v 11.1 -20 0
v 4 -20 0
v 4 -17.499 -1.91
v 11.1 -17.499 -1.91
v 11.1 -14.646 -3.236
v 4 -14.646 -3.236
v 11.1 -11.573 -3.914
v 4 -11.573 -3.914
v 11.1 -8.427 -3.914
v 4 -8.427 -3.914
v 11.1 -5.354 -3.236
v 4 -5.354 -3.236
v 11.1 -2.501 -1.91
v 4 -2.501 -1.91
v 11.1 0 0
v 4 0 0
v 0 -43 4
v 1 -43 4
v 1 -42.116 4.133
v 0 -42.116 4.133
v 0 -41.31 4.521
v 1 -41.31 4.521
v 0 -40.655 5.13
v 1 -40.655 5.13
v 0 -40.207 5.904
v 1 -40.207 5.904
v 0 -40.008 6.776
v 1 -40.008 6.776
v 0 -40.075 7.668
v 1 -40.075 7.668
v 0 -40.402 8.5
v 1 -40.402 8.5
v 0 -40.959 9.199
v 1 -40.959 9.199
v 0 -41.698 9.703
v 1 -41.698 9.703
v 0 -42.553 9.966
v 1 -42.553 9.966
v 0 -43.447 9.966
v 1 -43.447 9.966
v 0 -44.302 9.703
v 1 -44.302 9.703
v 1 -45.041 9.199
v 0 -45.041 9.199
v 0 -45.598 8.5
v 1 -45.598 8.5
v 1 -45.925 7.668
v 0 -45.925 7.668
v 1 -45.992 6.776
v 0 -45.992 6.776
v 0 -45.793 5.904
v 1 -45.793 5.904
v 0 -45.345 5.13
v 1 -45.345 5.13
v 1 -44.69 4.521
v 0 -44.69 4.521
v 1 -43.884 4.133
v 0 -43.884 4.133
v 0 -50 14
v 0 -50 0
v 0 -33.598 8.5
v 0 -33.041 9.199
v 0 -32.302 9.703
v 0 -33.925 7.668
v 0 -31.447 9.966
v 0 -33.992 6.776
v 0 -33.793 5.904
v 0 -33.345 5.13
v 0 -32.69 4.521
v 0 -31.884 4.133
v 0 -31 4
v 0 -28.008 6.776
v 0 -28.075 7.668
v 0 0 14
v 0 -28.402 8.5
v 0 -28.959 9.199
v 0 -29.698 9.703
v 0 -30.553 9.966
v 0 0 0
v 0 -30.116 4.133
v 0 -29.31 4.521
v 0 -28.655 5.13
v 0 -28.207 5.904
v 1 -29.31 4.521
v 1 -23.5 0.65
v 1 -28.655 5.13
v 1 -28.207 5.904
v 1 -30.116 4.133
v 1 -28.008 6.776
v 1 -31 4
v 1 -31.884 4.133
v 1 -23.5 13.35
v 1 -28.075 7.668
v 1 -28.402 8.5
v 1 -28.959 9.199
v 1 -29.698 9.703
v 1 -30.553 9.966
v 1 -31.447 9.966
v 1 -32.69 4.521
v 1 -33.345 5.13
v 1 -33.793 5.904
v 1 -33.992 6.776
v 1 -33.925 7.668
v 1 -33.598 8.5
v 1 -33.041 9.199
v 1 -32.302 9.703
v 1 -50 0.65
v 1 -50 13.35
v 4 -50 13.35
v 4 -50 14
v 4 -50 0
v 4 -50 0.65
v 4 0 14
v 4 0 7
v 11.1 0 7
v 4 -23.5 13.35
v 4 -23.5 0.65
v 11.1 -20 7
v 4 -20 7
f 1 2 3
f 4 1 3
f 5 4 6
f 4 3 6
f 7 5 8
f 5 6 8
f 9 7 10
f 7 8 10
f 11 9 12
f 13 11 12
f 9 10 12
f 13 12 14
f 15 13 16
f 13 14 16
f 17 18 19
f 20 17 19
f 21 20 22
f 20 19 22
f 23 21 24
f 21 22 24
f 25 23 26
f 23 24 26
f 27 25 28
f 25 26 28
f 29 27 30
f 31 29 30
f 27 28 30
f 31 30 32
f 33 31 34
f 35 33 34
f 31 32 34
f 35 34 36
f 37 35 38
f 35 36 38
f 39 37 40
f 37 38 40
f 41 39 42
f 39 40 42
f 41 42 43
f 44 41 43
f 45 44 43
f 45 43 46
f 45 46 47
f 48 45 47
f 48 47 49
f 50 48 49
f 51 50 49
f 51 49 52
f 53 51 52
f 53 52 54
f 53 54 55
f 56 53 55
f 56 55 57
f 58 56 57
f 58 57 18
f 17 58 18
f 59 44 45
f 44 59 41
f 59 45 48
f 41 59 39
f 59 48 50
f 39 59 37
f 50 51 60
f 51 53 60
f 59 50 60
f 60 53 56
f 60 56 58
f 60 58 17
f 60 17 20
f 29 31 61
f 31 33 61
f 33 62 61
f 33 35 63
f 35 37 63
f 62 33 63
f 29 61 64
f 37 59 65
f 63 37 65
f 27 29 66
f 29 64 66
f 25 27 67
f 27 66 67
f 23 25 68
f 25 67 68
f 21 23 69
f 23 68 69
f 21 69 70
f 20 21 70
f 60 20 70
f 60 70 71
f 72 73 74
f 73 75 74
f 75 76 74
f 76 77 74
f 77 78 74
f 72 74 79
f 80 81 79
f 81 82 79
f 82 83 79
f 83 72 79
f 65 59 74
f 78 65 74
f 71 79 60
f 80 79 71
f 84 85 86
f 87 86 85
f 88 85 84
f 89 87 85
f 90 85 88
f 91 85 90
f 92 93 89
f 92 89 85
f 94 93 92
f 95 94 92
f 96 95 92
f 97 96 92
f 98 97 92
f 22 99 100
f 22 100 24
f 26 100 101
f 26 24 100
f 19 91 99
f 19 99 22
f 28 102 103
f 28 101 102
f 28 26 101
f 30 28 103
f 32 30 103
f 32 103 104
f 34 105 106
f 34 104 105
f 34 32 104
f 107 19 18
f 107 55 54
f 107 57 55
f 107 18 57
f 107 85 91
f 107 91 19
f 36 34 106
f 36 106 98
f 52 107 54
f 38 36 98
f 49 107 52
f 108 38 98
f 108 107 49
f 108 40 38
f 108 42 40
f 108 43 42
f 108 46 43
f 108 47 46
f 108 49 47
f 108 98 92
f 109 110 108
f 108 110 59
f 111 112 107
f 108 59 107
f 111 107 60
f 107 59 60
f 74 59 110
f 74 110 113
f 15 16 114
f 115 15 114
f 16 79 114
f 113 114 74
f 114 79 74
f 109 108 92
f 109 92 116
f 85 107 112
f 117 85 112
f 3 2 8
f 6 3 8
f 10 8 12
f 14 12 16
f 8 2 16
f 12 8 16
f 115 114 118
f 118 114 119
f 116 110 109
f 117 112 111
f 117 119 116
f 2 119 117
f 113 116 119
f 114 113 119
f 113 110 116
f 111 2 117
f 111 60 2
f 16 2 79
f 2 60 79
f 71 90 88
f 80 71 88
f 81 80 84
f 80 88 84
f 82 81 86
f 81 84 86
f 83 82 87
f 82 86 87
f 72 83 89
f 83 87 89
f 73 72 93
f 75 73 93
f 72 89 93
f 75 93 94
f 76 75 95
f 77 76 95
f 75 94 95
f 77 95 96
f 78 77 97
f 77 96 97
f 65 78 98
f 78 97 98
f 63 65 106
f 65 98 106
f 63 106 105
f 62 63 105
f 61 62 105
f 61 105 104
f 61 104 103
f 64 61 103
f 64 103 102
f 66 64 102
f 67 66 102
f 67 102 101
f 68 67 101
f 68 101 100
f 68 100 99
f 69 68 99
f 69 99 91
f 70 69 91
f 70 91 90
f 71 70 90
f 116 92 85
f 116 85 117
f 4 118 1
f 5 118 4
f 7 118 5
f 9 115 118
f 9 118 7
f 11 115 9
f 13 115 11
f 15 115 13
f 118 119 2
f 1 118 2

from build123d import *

# Parameters (mm, degrees)
CROQUIS1_W              = 14
CROQUIS1_H              = 50
SALIENTE_EXTRUIR1_DEPTH = 4
CROQUIS2_W              = 3
CROQUIS2_H              = 12.7
CORTAR_EXTRUIR1_DEPTH   = 26.5
SALIENTE_EXTRUIR2_DEPTH = 7.1
CORTAR_EXTRUIR2_REACH   = 54.896
CROQUIS4_R              = 3


with BuildPart() as part:
    # Croquis1 → Saliente-Extruir1 (new body)
    with BuildSketch(Plane(origin=(0, 0, 0), x_dir=(0, 0, -1), z_dir=(1, 0, 0))):
        with Locations((-7, -25)):
            Rectangle(CROQUIS1_W, CROQUIS1_H)
    extrude(amount=SALIENTE_EXTRUIR1_DEPTH)

    # Croquis2 → Cortar-Extruir1 (cut)
    with BuildSketch(Plane.XZ.offset(50)):
        with Locations((2.5, 7)):
            Rectangle(CROQUIS2_W, CROQUIS2_H)
    extrude(amount=-CORTAR_EXTRUIR1_DEPTH, mode=Mode.SUBTRACT)

    # Croquis3 → Saliente-Extruir2 (add)
    with BuildSketch(Plane(origin=(4, 0, 0), x_dir=(0, 0, -1), z_dir=(1, 0, 0))):
        with BuildLine():
            ThreePointArc((0, -20), (4, -10), (0, 0))
            Line((0, 0), (0, -10))
            Line((0, -10), (0, -20))
        make_face()
        Polygon((0, 0), (-7, 0), (-7, -20), (0, -20), (0, -10), align=None)
    extrude(amount=SALIENTE_EXTRUIR2_DEPTH)

    # Croquis4 → Cortar-Extruir2 (cut, up to next)
    with BuildSketch(Plane(origin=(1, 0, 0), x_dir=(0, 0, -1), z_dir=(1, 0, 0)), mode=Mode.PRIVATE) as cortar_extruir2_sk1:
        with Locations((-7, -31)):
            Circle(CROQUIS4_R)
    cortar_extruir2_tool1 = extrude(cortar_extruir2_sk1.sketch, amount=-CORTAR_EXTRUIR2_REACH, mode=Mode.PRIVATE) & part.part
    # Croquis4 → Cortar-Extruir2 (cut, up to next)
    with BuildSketch(Plane(origin=(1, 0, 0), x_dir=(0, 0, -1), z_dir=(1, 0, 0)), mode=Mode.PRIVATE) as cortar_extruir2_sk2:
        with Locations((-7, -43)):
            Circle(CROQUIS4_R)
    cortar_extruir2_tool2 = extrude(cortar_extruir2_sk2.sketch, amount=-CORTAR_EXTRUIR2_REACH, mode=Mode.PRIVATE) & part.part
    add(cortar_extruir2_tool1.solids().sort_by_distance((1, -31, 7))[0], mode=Mode.SUBTRACT)
    add(cortar_extruir2_tool2.solids().sort_by_distance((1, -43, 7))[0], mode=Mode.SUBTRACT)


solid = part.part
